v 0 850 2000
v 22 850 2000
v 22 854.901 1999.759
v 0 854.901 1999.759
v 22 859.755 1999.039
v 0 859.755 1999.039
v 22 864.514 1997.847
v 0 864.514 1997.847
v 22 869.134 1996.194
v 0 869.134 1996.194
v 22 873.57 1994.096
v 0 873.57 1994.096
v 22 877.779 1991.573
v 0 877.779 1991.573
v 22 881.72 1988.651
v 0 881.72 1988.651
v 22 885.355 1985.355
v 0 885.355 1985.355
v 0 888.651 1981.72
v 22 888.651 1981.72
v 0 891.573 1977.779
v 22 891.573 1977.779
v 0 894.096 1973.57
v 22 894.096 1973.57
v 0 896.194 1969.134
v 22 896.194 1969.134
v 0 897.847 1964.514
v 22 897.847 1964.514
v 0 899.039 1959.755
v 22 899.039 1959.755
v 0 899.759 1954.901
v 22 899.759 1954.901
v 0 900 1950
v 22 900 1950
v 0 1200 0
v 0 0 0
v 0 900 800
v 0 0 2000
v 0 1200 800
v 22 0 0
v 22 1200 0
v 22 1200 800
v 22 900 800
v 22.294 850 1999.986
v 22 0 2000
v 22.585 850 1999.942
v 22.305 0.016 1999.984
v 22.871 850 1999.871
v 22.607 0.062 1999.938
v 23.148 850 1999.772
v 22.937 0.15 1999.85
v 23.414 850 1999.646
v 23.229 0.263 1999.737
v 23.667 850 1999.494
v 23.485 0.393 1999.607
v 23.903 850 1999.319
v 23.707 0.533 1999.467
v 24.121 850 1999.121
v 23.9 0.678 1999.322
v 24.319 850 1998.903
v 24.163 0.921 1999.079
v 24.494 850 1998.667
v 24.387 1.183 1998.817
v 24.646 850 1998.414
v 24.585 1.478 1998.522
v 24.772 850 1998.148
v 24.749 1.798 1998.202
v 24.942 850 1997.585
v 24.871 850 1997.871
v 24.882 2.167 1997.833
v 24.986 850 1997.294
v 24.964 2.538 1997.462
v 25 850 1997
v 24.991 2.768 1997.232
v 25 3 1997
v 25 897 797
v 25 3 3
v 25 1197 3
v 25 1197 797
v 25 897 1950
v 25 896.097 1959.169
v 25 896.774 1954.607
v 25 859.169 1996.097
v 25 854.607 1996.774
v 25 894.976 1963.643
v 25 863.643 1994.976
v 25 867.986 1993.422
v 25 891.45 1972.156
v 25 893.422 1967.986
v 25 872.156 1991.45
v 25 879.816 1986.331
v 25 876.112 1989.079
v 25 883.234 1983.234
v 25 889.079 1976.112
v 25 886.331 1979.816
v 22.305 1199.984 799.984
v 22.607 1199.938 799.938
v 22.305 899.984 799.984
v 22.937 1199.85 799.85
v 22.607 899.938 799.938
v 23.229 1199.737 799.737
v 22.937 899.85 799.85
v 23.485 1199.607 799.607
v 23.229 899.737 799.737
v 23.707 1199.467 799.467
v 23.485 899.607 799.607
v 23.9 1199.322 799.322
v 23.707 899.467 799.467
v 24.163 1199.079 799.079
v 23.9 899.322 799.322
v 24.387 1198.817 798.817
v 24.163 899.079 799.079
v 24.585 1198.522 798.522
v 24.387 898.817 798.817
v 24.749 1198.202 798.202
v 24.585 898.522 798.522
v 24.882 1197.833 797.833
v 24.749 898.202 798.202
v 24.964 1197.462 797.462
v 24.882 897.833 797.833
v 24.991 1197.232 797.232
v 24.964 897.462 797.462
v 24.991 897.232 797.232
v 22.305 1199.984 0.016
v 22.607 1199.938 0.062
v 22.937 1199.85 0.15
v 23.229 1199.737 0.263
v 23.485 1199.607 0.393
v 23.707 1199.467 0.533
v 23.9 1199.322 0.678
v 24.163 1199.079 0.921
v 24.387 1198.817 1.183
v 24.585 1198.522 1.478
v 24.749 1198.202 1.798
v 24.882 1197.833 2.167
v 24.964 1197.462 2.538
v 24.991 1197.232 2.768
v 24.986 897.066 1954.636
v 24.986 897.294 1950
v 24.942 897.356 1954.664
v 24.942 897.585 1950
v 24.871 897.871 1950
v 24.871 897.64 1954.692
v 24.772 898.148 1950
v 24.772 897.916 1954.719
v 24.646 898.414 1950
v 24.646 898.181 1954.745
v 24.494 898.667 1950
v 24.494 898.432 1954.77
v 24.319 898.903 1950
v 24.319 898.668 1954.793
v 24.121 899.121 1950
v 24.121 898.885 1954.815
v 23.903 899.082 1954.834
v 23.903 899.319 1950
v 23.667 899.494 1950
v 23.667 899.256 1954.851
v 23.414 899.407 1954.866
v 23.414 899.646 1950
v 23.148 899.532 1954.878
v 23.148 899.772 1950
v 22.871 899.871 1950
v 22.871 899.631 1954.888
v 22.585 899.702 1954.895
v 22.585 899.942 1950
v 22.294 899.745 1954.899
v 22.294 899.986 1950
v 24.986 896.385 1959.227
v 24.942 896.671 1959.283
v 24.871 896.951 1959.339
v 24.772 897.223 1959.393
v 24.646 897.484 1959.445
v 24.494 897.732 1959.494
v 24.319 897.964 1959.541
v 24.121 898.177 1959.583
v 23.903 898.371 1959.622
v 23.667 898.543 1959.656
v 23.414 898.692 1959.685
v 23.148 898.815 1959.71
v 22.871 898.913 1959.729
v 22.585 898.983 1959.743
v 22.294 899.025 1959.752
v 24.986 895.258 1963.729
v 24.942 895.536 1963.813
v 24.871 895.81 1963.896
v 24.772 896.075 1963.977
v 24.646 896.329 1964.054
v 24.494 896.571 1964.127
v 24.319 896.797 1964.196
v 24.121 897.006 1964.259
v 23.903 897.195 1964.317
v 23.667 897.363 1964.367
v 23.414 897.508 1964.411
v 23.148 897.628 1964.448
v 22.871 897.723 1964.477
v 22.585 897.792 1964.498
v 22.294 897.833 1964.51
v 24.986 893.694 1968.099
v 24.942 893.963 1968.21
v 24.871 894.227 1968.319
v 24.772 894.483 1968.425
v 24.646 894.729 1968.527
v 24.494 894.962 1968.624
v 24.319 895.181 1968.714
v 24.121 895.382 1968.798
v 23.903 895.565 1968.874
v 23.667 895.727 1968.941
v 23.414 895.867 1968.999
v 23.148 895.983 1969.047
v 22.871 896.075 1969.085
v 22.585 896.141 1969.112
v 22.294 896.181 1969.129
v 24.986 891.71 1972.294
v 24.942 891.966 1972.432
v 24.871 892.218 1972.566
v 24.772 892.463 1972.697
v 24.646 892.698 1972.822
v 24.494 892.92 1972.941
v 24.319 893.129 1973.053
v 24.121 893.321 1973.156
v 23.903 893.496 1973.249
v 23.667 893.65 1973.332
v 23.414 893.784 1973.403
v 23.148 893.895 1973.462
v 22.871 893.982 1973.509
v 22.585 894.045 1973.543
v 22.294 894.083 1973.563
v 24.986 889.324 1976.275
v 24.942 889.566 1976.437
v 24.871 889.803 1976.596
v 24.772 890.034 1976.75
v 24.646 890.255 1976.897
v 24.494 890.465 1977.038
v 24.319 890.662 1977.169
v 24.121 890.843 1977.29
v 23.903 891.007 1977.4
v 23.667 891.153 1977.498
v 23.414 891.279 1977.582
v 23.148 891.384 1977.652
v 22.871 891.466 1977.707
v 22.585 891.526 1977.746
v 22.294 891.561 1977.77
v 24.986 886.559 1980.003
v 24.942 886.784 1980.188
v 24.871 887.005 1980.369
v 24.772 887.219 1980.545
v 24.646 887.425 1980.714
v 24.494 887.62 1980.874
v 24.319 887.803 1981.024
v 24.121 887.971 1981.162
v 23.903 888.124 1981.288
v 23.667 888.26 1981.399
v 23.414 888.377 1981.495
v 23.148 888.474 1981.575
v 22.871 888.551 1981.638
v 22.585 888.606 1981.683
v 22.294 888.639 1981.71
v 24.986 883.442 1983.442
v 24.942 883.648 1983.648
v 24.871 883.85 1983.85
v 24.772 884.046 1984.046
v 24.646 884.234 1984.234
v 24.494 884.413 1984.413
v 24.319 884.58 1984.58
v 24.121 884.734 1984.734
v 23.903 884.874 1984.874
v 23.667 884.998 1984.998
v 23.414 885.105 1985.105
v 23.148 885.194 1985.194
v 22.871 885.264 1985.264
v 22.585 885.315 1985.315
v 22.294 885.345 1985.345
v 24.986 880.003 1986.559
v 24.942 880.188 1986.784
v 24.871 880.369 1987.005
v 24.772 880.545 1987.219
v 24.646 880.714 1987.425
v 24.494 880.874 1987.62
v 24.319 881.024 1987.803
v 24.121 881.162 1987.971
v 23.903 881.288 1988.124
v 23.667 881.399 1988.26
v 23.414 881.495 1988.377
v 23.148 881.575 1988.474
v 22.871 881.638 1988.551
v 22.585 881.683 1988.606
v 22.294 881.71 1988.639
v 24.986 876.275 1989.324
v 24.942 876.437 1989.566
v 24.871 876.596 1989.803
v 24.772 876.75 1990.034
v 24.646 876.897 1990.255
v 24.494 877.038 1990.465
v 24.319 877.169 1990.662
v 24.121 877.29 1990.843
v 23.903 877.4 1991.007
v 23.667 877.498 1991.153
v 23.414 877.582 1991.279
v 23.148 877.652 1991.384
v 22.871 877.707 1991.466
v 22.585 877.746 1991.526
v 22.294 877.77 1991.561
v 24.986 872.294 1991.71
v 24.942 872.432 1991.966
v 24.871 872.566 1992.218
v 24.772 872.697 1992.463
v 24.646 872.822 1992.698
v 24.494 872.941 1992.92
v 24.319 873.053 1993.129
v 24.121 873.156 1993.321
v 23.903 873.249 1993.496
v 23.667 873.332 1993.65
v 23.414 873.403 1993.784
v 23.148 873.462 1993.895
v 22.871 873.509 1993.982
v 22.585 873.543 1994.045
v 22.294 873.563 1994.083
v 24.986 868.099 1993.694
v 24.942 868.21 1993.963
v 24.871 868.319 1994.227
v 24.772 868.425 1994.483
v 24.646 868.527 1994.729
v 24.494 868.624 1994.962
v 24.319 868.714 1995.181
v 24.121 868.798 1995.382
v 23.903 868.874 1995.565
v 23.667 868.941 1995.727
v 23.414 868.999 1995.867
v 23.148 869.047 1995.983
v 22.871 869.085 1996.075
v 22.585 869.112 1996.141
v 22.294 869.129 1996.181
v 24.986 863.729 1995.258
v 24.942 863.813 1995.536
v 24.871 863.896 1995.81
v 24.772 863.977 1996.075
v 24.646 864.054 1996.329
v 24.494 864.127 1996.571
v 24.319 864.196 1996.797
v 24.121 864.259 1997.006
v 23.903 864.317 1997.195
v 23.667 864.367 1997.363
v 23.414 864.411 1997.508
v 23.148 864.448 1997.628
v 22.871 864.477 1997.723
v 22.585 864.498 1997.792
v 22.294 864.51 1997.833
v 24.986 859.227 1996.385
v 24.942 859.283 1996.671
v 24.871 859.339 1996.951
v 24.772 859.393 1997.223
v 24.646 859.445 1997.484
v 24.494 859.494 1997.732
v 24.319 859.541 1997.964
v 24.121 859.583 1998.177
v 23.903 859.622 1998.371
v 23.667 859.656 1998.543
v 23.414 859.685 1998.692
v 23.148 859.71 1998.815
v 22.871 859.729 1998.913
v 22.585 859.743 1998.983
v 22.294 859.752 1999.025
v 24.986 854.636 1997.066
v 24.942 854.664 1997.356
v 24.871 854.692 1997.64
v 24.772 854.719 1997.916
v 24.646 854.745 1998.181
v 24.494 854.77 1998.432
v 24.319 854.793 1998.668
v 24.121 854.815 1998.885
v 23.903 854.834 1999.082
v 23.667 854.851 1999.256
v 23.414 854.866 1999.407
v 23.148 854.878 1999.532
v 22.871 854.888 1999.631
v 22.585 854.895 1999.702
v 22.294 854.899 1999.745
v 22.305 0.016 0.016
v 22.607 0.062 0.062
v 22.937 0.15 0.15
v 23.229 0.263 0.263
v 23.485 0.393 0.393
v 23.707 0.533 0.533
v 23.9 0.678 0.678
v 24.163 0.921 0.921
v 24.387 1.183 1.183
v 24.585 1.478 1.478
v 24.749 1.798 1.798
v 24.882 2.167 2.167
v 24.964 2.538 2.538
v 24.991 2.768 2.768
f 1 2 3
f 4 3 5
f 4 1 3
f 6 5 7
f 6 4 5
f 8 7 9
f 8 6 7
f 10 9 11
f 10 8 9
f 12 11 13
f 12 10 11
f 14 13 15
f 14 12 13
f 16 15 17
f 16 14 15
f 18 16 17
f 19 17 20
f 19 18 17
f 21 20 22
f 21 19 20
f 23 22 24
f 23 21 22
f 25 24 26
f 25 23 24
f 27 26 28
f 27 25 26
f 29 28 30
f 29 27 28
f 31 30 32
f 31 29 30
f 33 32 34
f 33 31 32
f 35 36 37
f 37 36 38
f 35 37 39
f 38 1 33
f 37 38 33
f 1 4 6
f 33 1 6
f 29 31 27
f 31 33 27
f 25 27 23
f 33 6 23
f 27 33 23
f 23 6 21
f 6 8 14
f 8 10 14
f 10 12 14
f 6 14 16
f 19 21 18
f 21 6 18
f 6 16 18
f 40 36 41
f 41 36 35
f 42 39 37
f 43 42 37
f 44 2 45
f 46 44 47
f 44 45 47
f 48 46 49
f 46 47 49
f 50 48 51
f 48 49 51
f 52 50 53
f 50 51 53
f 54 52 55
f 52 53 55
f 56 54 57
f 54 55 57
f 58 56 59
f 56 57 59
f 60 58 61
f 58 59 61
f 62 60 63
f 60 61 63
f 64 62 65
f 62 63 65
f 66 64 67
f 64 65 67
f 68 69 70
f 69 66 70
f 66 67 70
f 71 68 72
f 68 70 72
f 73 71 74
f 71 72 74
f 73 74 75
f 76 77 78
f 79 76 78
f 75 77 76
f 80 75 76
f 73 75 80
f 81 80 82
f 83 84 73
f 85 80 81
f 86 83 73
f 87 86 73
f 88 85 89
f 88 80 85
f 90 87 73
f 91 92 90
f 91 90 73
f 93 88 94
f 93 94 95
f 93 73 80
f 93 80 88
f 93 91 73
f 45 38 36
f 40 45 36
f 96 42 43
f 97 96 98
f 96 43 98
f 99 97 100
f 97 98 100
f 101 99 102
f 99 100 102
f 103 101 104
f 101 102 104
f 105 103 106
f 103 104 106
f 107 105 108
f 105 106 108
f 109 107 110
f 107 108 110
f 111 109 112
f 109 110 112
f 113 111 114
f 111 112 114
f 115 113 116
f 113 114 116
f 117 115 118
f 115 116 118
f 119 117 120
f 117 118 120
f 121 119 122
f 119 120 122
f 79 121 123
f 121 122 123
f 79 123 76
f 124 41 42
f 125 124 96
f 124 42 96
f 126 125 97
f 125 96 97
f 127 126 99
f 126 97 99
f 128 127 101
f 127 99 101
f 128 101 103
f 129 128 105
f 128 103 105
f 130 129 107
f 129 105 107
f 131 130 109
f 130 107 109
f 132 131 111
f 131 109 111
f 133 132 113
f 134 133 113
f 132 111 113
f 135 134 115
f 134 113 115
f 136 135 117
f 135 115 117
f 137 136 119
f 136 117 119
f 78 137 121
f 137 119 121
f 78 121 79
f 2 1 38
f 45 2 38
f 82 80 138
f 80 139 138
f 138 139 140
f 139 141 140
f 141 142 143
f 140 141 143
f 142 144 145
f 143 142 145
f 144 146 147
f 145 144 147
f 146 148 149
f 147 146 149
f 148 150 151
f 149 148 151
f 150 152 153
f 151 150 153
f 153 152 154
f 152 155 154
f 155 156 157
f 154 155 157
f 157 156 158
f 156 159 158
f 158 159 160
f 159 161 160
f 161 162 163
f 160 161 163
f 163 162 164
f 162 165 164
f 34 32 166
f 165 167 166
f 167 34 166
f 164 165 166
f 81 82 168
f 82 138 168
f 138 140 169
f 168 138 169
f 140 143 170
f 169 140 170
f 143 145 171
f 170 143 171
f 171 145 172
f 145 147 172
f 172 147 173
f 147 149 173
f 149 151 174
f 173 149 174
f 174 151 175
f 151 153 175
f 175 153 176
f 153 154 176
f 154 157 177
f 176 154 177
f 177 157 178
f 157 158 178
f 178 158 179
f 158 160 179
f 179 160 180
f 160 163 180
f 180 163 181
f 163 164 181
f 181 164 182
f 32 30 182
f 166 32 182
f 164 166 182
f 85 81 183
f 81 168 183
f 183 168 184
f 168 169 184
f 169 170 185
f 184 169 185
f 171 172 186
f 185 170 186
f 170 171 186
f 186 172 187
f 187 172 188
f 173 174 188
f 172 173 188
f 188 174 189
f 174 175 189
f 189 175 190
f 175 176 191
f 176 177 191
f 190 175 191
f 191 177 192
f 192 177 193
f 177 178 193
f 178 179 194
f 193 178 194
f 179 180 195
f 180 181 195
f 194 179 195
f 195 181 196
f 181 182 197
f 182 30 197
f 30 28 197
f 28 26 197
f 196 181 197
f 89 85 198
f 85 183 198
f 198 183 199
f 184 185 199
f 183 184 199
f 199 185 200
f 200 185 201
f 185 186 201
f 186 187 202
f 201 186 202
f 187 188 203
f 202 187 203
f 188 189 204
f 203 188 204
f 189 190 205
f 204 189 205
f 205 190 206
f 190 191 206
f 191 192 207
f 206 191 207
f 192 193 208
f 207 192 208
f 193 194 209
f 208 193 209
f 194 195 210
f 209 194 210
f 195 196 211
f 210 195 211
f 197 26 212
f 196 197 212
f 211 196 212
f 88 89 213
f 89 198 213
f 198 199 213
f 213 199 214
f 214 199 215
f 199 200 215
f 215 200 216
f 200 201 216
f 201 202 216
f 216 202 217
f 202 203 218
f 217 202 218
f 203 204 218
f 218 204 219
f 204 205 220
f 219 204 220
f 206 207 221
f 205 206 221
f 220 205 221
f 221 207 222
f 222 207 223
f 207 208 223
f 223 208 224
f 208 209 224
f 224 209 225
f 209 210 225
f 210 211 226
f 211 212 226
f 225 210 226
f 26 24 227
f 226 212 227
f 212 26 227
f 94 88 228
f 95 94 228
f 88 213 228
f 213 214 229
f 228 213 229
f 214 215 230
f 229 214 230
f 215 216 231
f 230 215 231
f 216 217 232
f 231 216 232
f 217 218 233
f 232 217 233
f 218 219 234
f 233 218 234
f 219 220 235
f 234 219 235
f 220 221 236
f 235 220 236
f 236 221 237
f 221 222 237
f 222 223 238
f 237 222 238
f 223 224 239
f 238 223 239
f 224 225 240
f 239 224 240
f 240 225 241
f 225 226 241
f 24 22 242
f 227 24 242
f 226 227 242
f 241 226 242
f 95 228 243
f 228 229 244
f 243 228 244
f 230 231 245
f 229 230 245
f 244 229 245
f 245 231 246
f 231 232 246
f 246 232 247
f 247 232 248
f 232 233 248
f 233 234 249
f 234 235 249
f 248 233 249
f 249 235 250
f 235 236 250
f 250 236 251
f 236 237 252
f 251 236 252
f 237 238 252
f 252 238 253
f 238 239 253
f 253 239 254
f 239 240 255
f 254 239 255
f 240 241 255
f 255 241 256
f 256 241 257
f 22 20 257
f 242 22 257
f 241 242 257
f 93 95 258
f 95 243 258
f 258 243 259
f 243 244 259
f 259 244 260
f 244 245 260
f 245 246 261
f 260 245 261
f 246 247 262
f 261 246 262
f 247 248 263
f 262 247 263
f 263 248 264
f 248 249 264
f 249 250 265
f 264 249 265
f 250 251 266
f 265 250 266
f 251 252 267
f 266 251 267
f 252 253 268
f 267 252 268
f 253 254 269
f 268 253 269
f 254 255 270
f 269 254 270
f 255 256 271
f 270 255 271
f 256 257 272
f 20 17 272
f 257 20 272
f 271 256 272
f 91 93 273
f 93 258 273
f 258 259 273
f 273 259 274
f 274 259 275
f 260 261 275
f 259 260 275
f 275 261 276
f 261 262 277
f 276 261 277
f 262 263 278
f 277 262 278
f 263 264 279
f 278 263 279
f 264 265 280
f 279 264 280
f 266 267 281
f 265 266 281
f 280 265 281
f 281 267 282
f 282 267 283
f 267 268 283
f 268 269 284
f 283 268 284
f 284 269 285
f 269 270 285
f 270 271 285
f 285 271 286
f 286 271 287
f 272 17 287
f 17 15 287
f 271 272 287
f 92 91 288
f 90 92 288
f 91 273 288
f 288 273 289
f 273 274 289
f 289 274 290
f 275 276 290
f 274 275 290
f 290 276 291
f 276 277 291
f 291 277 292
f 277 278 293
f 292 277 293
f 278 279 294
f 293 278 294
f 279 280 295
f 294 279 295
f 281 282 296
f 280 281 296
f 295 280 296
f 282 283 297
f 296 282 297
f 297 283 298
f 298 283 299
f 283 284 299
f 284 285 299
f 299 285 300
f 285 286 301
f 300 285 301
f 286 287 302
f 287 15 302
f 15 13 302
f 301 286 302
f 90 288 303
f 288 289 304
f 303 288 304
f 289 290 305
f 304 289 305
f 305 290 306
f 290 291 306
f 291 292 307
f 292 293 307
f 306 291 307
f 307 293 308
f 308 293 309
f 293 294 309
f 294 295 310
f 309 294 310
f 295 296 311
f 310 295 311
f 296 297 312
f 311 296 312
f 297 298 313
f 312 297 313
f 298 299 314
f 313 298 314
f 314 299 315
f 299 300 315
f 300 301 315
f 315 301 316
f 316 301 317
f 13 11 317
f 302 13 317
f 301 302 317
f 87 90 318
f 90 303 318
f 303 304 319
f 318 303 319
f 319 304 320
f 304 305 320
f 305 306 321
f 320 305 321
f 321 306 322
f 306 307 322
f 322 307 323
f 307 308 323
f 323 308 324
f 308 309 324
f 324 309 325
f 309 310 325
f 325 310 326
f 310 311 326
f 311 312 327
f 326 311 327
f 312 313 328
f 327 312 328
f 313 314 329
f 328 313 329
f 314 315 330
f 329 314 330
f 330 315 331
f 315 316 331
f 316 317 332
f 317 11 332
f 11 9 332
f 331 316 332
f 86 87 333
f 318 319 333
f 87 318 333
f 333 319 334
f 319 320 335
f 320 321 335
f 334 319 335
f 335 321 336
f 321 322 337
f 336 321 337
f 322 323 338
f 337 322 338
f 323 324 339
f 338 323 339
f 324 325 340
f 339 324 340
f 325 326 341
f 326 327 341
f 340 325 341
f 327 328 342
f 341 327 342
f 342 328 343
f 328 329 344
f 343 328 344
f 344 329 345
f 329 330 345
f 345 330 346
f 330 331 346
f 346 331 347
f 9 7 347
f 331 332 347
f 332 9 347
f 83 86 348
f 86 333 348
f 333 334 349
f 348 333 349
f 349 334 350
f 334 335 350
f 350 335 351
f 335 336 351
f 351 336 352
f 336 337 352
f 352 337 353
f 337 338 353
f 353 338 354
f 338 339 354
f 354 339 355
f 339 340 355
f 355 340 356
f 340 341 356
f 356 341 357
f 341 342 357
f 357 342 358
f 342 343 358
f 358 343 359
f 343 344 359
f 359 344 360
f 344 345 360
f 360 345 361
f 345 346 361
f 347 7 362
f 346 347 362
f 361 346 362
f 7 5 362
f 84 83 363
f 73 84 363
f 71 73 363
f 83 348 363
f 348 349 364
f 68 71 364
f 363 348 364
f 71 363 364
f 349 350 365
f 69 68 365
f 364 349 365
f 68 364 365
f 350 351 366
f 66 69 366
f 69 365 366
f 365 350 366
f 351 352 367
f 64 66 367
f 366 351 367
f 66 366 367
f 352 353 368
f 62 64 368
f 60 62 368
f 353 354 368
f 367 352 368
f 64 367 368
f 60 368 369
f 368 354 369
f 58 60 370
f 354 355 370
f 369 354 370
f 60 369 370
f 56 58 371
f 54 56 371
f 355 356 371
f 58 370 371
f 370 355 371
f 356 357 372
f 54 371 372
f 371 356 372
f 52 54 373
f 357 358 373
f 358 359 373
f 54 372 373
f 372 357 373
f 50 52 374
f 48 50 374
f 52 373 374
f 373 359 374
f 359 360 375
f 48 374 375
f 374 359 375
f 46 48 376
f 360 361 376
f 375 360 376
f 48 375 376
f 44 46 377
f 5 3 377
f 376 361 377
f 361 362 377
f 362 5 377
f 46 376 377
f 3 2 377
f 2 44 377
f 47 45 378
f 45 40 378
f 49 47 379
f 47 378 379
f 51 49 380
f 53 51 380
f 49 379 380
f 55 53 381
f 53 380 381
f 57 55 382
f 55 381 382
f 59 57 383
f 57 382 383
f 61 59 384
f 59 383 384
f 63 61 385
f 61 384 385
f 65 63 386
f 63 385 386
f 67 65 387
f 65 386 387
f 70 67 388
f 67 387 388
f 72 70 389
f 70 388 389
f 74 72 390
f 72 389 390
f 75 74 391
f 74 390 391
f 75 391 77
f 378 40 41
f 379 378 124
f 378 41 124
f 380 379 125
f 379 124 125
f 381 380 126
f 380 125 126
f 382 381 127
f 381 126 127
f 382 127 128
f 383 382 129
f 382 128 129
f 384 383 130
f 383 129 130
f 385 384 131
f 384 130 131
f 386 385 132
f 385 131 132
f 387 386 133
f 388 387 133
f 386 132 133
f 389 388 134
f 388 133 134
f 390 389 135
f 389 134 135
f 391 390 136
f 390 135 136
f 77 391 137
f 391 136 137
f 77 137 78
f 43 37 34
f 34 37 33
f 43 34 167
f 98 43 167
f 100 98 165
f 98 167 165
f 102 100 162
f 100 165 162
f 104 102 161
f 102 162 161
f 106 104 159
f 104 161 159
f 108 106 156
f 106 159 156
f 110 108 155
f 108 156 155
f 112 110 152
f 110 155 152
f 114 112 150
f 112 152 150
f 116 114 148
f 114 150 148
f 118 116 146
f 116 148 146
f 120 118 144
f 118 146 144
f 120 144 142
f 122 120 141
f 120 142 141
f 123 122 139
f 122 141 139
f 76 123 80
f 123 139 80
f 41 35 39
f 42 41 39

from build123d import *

# Parameters (mm, degrees)
F1_DEPTH    = 25
F2_R        = 3
F3_T1_DEPTH = 150
F3_T4_ANGLE = 90


# Not quite as in the source:
# - a fillet or chamfer that OpenCascade refuses, or shapes differently, is made with other operations: its cross-section is extruded or revolved along the edge and cut away or added


with BuildPart() as f1:
    # F0 (on Right) → F1 (new body)
    with BuildSketch(Plane.YZ):
        Polygon((0, 2000), (0, 0), (1200, 0), (1200, 800), (900, 800), (900, 2000), align=None)
    extrude(amount=F1_DEPTH)

    # F2
    f2_edges = [f1.edges().sort_by_distance(p)[0] for p in [
        (25, 0, 1000),
        (25, 600, 0),
        (25, 1200, 400),
        (25, 1050, 800),
        (25, 900, 1400),
        (25, 450, 2000),
    ]]
    fillet(f2_edges, radius=F2_R)

    # F3: fillet of radius 50 on 1 edges, made by hand

    # F3_s2 → F3_t1 (cut)
    with BuildSketch(Plane.YZ.offset(-125)):
        with BuildLine():
            ThreePointArc((850, 2000), (885.3553390593, 1985.3553390593), (900, 1950))
            Line((900, 1950), (900, 2000))
            Line((900, 2000), (850, 2000))
        make_face()
    extrude(amount=F3_T1_DEPTH, mode=Mode.SUBTRACT)

    # F3_s3 → F3_t4 (revolve, cut)
    with BuildSketch(Plane.XY.offset(1950)):
        with BuildLine():
            ThreePointArc((25, 897), (24.1213203436, 899.1213203436), (22, 900))
            Line((22, 900), (25, 900))
            Line((25, 900), (25, 897))
        make_face()
    revolve(axis=Axis((25, 850, 1950), (1, 0, 0)), revolution_arc=F3_T4_ANGLE, mode=Mode.SUBTRACT)


solid = f1.part
